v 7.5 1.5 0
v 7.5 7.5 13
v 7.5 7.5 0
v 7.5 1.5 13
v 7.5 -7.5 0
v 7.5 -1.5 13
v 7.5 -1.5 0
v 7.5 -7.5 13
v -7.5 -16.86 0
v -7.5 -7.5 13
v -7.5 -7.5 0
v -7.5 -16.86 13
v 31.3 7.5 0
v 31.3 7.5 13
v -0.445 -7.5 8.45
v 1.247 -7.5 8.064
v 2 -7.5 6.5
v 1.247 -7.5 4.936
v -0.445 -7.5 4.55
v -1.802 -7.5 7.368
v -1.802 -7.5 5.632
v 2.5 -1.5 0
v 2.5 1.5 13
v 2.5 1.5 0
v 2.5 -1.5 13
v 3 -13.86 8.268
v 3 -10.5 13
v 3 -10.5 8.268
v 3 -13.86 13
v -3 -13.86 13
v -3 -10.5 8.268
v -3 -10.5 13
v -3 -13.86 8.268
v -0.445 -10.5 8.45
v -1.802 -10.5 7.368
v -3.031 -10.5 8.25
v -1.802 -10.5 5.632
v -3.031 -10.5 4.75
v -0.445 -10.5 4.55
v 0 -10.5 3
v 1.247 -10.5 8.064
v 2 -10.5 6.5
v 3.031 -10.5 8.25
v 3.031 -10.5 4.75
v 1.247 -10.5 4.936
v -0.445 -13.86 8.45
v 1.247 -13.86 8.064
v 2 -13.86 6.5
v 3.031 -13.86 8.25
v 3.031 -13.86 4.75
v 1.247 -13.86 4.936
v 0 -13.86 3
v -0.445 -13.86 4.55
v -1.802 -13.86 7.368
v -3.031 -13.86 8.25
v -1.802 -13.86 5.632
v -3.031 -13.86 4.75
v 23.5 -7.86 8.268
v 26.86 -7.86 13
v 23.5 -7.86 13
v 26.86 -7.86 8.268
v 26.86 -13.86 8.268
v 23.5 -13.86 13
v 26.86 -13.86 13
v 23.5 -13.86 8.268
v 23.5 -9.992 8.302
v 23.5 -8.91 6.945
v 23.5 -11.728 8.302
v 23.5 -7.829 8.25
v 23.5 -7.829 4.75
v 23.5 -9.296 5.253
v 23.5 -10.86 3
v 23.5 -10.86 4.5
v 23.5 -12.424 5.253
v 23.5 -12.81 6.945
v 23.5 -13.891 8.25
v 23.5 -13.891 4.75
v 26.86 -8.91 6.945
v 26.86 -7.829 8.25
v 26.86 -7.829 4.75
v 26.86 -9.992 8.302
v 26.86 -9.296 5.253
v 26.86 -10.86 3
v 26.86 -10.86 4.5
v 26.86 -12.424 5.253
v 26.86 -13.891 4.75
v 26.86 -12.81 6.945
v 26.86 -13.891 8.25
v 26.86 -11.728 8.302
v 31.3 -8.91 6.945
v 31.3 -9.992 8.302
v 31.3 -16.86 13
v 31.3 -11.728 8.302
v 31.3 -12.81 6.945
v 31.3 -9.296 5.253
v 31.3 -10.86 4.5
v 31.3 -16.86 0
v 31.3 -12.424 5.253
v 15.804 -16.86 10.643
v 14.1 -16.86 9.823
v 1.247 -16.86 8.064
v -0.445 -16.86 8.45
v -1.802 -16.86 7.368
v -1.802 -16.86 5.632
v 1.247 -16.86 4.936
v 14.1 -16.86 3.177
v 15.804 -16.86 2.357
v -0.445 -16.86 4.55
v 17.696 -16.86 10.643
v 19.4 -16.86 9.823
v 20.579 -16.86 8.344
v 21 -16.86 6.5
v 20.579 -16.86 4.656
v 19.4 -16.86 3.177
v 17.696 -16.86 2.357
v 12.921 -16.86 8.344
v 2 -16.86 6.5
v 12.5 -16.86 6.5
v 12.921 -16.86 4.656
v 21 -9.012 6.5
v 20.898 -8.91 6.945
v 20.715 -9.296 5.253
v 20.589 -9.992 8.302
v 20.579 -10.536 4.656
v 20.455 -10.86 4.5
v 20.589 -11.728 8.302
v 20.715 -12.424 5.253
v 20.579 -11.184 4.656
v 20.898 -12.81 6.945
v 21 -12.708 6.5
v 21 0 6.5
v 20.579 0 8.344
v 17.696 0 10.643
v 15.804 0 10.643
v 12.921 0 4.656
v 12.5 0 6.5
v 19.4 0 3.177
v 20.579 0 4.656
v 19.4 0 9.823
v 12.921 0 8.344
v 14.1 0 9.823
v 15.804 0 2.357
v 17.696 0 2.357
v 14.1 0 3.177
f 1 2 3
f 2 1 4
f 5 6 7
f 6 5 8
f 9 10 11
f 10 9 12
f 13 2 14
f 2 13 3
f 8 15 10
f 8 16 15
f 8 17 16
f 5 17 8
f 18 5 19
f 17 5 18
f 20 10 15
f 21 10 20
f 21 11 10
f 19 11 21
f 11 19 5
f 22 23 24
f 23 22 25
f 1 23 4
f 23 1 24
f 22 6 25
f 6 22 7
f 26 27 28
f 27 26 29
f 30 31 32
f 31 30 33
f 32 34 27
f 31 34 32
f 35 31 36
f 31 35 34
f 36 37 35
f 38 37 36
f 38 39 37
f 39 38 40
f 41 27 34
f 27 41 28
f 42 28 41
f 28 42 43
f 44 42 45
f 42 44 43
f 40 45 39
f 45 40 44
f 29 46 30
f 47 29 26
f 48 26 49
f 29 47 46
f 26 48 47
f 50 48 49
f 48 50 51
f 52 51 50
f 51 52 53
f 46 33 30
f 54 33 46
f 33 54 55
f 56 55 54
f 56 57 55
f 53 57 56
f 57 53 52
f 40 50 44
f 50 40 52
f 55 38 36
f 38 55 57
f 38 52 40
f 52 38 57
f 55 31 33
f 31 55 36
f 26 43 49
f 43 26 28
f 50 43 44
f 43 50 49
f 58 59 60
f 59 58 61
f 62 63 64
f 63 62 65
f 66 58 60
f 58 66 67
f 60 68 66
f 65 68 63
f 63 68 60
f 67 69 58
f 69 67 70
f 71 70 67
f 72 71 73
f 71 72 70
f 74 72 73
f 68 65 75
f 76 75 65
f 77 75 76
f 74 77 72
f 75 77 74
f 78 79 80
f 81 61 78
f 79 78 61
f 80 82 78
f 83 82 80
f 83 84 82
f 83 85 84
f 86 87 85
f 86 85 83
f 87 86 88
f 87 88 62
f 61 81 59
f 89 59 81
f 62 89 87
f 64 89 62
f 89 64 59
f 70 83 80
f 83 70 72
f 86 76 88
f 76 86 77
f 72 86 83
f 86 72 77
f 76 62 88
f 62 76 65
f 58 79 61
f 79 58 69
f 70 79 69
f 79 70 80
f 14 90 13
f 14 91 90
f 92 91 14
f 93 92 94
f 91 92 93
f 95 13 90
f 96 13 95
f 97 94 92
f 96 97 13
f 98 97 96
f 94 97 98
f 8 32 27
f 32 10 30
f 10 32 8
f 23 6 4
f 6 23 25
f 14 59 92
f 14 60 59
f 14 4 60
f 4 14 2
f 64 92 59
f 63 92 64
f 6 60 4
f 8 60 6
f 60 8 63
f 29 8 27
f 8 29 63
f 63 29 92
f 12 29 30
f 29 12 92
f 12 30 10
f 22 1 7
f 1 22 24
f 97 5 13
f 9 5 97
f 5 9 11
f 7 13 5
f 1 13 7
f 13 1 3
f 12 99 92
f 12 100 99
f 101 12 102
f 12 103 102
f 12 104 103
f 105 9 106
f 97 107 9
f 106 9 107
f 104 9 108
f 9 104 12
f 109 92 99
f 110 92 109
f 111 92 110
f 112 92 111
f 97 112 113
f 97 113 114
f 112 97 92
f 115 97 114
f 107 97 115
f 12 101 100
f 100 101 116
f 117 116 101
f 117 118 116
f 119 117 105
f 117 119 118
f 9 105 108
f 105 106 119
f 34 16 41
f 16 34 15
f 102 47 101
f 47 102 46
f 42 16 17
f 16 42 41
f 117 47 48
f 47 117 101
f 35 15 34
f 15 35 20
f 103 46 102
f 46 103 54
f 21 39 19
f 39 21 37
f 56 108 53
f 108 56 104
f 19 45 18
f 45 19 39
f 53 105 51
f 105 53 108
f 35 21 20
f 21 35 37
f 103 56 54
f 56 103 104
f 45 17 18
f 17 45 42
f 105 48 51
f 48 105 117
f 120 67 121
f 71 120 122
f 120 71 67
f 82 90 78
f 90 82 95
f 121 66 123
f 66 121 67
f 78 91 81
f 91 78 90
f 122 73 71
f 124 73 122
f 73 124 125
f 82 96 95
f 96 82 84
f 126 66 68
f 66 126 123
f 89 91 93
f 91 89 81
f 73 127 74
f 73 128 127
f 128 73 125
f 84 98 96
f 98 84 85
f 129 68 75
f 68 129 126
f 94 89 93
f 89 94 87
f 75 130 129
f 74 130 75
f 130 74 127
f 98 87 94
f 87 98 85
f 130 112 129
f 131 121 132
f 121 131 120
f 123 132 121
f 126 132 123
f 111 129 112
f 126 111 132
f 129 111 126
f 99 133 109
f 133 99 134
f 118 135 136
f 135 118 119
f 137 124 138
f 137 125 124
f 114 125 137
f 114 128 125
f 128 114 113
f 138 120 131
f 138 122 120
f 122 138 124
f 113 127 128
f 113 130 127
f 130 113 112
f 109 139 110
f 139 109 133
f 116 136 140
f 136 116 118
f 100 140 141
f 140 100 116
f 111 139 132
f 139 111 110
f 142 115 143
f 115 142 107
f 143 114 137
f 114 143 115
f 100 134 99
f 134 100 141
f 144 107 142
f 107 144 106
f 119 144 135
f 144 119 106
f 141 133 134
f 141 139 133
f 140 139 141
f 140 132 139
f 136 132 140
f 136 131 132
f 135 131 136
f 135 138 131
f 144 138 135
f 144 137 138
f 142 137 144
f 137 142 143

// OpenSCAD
// Modification and fixes to http://www.thingiverse.com/thing:30491

// TODO - separate bolt and nut sizes for rail and rod clamps?

//CUSTOMIZER VARIABLES

/* [Basic_Parameters] */

// Support rod diameter, in mm
rod_diameter= 8.0;  // [3:0.1:40]

// Bolt diameter, in mm
bolt_diameter= 3.0;    // [2:0.1:20]

// Nut diameter, in mm
nut_diameter= 6.0;  // [3:0.1:40]

// Nut thickness, in mm
nut_thickness= 2.8;  // [2:0.1:30]

/* [Extra_Features_for_Strength] */

// rod clamp width margin, in mm
clamp_margin= 5;   // [3:30]

// margin to support the rod in xy, in mm
rod_margin= 7; // [3:30]

// margin to support the rod in z, in mm
depth_margin= 5;   // [3:30]

// Openbeam size, in mm
openrail_size= 15;   // [10:50]

//CUSTOMIZER VARIABLES END


// how much extra space to allow in nut trap
nut_space_factor = 1.2;


// Sanity checks
if( rod_diameter <= 0 || bolt_diameter <= 0 
    || nut_diameter <= 0 || nut_thickness <= 0 )
{
    echo("<B>Error: Missing important parameters</B>");
}

if(nut_diameter<=bolt_diameter)
{
    echo("<B>Error: Nut size too small for bolt</B>");
}

// z depth
main_depth= max( 10, max(rod_diameter,bolt_diameter,nut_diameter)+depth_margin );

nut_trap_len = nut_thickness*nut_space_factor;

// our object, translated to be flat on xy plane for easy STL generation
translate([0,0,main_depth/2])
    optics_rail();

module optics_rail(){
        
    main_width= (openrail_size+1)+(rod_diameter+rod_margin)+clamp_margin+nut_thickness;
    main_height= (openrail_size+1)+(nut_trap_len+clamp_margin);
    bolt_rad= (bolt_diameter+1)/2;  // this should be sorta loose
    rod_rad= (rod_diameter+0.5)/2;  // should be almost tight
    rod_x= ((openrail_size+1)/2)+(rod_rad+1) + rod_margin/2;
    nut_x= rod_x + rod_rad + (clamp_margin/2);

    difference(){

        // the main block
        translate([(main_width-openrail_size)/2,-(main_height/2)+(openrail_size/2),0])
            cube([main_width,main_height,main_depth],center = true);
    
        // subtract the space used by the openbeam
        openrail_model();
    
        // nut and bolt hole for attaching to beam
        trap_y = -(main_height-((openrail_size+1)/2)) + nut_trap_len + clamp_margin/2;
        translate([0,trap_y,0])
            rotate([0,0,0])
                nuttrap();
        translate([0,-3,0])
          rotate([90,0,0])
            cylinder(100,bolt_rad,bolt_rad);
    
        // nut and bolt hole for clamping the rod
        trap2_y = -(main_height-(openrail_size/2)) + (nut_diameter+1)/2 + clamp_margin/2;
        translate([nut_x,trap2_y,0]) 
            rotate([0,0,90])
                nuttrap();
        translate([rod_x,trap2_y,0])
            rotate([0,90,0])
                cylinder(100,bolt_rad,bolt_rad);
    
        // the support rod
        #translate([rod_x,0,0])
            rotate([90,0,0])
               cylinder(main_height+10,rod_rad,rod_rad);
    }
}


module openrail_model(){
  difference(){
    cube([openrail_size, openrail_size, main_depth+5], center = true);
   translate([openrail_size/3,0,0])
      cube([openrail_size/3,bolt_diameter,main_depth+2], center = true);
  }
}

module hexagon(height,radius) 
{
  linear_extrude(height=height)
    circle(r=radius,$fn=6);
}

module nuttrap(){
  translate([0,-nut_trap_len/2,main_depth/2])
    cube([nut_diameter,nut_trap_len,main_depth],center =true);
  rotate([90,360/12,0]) // so point is down, trapped by straight sides
    hexagon(nut_trap_len,(nut_diameter+1)/2);
}
